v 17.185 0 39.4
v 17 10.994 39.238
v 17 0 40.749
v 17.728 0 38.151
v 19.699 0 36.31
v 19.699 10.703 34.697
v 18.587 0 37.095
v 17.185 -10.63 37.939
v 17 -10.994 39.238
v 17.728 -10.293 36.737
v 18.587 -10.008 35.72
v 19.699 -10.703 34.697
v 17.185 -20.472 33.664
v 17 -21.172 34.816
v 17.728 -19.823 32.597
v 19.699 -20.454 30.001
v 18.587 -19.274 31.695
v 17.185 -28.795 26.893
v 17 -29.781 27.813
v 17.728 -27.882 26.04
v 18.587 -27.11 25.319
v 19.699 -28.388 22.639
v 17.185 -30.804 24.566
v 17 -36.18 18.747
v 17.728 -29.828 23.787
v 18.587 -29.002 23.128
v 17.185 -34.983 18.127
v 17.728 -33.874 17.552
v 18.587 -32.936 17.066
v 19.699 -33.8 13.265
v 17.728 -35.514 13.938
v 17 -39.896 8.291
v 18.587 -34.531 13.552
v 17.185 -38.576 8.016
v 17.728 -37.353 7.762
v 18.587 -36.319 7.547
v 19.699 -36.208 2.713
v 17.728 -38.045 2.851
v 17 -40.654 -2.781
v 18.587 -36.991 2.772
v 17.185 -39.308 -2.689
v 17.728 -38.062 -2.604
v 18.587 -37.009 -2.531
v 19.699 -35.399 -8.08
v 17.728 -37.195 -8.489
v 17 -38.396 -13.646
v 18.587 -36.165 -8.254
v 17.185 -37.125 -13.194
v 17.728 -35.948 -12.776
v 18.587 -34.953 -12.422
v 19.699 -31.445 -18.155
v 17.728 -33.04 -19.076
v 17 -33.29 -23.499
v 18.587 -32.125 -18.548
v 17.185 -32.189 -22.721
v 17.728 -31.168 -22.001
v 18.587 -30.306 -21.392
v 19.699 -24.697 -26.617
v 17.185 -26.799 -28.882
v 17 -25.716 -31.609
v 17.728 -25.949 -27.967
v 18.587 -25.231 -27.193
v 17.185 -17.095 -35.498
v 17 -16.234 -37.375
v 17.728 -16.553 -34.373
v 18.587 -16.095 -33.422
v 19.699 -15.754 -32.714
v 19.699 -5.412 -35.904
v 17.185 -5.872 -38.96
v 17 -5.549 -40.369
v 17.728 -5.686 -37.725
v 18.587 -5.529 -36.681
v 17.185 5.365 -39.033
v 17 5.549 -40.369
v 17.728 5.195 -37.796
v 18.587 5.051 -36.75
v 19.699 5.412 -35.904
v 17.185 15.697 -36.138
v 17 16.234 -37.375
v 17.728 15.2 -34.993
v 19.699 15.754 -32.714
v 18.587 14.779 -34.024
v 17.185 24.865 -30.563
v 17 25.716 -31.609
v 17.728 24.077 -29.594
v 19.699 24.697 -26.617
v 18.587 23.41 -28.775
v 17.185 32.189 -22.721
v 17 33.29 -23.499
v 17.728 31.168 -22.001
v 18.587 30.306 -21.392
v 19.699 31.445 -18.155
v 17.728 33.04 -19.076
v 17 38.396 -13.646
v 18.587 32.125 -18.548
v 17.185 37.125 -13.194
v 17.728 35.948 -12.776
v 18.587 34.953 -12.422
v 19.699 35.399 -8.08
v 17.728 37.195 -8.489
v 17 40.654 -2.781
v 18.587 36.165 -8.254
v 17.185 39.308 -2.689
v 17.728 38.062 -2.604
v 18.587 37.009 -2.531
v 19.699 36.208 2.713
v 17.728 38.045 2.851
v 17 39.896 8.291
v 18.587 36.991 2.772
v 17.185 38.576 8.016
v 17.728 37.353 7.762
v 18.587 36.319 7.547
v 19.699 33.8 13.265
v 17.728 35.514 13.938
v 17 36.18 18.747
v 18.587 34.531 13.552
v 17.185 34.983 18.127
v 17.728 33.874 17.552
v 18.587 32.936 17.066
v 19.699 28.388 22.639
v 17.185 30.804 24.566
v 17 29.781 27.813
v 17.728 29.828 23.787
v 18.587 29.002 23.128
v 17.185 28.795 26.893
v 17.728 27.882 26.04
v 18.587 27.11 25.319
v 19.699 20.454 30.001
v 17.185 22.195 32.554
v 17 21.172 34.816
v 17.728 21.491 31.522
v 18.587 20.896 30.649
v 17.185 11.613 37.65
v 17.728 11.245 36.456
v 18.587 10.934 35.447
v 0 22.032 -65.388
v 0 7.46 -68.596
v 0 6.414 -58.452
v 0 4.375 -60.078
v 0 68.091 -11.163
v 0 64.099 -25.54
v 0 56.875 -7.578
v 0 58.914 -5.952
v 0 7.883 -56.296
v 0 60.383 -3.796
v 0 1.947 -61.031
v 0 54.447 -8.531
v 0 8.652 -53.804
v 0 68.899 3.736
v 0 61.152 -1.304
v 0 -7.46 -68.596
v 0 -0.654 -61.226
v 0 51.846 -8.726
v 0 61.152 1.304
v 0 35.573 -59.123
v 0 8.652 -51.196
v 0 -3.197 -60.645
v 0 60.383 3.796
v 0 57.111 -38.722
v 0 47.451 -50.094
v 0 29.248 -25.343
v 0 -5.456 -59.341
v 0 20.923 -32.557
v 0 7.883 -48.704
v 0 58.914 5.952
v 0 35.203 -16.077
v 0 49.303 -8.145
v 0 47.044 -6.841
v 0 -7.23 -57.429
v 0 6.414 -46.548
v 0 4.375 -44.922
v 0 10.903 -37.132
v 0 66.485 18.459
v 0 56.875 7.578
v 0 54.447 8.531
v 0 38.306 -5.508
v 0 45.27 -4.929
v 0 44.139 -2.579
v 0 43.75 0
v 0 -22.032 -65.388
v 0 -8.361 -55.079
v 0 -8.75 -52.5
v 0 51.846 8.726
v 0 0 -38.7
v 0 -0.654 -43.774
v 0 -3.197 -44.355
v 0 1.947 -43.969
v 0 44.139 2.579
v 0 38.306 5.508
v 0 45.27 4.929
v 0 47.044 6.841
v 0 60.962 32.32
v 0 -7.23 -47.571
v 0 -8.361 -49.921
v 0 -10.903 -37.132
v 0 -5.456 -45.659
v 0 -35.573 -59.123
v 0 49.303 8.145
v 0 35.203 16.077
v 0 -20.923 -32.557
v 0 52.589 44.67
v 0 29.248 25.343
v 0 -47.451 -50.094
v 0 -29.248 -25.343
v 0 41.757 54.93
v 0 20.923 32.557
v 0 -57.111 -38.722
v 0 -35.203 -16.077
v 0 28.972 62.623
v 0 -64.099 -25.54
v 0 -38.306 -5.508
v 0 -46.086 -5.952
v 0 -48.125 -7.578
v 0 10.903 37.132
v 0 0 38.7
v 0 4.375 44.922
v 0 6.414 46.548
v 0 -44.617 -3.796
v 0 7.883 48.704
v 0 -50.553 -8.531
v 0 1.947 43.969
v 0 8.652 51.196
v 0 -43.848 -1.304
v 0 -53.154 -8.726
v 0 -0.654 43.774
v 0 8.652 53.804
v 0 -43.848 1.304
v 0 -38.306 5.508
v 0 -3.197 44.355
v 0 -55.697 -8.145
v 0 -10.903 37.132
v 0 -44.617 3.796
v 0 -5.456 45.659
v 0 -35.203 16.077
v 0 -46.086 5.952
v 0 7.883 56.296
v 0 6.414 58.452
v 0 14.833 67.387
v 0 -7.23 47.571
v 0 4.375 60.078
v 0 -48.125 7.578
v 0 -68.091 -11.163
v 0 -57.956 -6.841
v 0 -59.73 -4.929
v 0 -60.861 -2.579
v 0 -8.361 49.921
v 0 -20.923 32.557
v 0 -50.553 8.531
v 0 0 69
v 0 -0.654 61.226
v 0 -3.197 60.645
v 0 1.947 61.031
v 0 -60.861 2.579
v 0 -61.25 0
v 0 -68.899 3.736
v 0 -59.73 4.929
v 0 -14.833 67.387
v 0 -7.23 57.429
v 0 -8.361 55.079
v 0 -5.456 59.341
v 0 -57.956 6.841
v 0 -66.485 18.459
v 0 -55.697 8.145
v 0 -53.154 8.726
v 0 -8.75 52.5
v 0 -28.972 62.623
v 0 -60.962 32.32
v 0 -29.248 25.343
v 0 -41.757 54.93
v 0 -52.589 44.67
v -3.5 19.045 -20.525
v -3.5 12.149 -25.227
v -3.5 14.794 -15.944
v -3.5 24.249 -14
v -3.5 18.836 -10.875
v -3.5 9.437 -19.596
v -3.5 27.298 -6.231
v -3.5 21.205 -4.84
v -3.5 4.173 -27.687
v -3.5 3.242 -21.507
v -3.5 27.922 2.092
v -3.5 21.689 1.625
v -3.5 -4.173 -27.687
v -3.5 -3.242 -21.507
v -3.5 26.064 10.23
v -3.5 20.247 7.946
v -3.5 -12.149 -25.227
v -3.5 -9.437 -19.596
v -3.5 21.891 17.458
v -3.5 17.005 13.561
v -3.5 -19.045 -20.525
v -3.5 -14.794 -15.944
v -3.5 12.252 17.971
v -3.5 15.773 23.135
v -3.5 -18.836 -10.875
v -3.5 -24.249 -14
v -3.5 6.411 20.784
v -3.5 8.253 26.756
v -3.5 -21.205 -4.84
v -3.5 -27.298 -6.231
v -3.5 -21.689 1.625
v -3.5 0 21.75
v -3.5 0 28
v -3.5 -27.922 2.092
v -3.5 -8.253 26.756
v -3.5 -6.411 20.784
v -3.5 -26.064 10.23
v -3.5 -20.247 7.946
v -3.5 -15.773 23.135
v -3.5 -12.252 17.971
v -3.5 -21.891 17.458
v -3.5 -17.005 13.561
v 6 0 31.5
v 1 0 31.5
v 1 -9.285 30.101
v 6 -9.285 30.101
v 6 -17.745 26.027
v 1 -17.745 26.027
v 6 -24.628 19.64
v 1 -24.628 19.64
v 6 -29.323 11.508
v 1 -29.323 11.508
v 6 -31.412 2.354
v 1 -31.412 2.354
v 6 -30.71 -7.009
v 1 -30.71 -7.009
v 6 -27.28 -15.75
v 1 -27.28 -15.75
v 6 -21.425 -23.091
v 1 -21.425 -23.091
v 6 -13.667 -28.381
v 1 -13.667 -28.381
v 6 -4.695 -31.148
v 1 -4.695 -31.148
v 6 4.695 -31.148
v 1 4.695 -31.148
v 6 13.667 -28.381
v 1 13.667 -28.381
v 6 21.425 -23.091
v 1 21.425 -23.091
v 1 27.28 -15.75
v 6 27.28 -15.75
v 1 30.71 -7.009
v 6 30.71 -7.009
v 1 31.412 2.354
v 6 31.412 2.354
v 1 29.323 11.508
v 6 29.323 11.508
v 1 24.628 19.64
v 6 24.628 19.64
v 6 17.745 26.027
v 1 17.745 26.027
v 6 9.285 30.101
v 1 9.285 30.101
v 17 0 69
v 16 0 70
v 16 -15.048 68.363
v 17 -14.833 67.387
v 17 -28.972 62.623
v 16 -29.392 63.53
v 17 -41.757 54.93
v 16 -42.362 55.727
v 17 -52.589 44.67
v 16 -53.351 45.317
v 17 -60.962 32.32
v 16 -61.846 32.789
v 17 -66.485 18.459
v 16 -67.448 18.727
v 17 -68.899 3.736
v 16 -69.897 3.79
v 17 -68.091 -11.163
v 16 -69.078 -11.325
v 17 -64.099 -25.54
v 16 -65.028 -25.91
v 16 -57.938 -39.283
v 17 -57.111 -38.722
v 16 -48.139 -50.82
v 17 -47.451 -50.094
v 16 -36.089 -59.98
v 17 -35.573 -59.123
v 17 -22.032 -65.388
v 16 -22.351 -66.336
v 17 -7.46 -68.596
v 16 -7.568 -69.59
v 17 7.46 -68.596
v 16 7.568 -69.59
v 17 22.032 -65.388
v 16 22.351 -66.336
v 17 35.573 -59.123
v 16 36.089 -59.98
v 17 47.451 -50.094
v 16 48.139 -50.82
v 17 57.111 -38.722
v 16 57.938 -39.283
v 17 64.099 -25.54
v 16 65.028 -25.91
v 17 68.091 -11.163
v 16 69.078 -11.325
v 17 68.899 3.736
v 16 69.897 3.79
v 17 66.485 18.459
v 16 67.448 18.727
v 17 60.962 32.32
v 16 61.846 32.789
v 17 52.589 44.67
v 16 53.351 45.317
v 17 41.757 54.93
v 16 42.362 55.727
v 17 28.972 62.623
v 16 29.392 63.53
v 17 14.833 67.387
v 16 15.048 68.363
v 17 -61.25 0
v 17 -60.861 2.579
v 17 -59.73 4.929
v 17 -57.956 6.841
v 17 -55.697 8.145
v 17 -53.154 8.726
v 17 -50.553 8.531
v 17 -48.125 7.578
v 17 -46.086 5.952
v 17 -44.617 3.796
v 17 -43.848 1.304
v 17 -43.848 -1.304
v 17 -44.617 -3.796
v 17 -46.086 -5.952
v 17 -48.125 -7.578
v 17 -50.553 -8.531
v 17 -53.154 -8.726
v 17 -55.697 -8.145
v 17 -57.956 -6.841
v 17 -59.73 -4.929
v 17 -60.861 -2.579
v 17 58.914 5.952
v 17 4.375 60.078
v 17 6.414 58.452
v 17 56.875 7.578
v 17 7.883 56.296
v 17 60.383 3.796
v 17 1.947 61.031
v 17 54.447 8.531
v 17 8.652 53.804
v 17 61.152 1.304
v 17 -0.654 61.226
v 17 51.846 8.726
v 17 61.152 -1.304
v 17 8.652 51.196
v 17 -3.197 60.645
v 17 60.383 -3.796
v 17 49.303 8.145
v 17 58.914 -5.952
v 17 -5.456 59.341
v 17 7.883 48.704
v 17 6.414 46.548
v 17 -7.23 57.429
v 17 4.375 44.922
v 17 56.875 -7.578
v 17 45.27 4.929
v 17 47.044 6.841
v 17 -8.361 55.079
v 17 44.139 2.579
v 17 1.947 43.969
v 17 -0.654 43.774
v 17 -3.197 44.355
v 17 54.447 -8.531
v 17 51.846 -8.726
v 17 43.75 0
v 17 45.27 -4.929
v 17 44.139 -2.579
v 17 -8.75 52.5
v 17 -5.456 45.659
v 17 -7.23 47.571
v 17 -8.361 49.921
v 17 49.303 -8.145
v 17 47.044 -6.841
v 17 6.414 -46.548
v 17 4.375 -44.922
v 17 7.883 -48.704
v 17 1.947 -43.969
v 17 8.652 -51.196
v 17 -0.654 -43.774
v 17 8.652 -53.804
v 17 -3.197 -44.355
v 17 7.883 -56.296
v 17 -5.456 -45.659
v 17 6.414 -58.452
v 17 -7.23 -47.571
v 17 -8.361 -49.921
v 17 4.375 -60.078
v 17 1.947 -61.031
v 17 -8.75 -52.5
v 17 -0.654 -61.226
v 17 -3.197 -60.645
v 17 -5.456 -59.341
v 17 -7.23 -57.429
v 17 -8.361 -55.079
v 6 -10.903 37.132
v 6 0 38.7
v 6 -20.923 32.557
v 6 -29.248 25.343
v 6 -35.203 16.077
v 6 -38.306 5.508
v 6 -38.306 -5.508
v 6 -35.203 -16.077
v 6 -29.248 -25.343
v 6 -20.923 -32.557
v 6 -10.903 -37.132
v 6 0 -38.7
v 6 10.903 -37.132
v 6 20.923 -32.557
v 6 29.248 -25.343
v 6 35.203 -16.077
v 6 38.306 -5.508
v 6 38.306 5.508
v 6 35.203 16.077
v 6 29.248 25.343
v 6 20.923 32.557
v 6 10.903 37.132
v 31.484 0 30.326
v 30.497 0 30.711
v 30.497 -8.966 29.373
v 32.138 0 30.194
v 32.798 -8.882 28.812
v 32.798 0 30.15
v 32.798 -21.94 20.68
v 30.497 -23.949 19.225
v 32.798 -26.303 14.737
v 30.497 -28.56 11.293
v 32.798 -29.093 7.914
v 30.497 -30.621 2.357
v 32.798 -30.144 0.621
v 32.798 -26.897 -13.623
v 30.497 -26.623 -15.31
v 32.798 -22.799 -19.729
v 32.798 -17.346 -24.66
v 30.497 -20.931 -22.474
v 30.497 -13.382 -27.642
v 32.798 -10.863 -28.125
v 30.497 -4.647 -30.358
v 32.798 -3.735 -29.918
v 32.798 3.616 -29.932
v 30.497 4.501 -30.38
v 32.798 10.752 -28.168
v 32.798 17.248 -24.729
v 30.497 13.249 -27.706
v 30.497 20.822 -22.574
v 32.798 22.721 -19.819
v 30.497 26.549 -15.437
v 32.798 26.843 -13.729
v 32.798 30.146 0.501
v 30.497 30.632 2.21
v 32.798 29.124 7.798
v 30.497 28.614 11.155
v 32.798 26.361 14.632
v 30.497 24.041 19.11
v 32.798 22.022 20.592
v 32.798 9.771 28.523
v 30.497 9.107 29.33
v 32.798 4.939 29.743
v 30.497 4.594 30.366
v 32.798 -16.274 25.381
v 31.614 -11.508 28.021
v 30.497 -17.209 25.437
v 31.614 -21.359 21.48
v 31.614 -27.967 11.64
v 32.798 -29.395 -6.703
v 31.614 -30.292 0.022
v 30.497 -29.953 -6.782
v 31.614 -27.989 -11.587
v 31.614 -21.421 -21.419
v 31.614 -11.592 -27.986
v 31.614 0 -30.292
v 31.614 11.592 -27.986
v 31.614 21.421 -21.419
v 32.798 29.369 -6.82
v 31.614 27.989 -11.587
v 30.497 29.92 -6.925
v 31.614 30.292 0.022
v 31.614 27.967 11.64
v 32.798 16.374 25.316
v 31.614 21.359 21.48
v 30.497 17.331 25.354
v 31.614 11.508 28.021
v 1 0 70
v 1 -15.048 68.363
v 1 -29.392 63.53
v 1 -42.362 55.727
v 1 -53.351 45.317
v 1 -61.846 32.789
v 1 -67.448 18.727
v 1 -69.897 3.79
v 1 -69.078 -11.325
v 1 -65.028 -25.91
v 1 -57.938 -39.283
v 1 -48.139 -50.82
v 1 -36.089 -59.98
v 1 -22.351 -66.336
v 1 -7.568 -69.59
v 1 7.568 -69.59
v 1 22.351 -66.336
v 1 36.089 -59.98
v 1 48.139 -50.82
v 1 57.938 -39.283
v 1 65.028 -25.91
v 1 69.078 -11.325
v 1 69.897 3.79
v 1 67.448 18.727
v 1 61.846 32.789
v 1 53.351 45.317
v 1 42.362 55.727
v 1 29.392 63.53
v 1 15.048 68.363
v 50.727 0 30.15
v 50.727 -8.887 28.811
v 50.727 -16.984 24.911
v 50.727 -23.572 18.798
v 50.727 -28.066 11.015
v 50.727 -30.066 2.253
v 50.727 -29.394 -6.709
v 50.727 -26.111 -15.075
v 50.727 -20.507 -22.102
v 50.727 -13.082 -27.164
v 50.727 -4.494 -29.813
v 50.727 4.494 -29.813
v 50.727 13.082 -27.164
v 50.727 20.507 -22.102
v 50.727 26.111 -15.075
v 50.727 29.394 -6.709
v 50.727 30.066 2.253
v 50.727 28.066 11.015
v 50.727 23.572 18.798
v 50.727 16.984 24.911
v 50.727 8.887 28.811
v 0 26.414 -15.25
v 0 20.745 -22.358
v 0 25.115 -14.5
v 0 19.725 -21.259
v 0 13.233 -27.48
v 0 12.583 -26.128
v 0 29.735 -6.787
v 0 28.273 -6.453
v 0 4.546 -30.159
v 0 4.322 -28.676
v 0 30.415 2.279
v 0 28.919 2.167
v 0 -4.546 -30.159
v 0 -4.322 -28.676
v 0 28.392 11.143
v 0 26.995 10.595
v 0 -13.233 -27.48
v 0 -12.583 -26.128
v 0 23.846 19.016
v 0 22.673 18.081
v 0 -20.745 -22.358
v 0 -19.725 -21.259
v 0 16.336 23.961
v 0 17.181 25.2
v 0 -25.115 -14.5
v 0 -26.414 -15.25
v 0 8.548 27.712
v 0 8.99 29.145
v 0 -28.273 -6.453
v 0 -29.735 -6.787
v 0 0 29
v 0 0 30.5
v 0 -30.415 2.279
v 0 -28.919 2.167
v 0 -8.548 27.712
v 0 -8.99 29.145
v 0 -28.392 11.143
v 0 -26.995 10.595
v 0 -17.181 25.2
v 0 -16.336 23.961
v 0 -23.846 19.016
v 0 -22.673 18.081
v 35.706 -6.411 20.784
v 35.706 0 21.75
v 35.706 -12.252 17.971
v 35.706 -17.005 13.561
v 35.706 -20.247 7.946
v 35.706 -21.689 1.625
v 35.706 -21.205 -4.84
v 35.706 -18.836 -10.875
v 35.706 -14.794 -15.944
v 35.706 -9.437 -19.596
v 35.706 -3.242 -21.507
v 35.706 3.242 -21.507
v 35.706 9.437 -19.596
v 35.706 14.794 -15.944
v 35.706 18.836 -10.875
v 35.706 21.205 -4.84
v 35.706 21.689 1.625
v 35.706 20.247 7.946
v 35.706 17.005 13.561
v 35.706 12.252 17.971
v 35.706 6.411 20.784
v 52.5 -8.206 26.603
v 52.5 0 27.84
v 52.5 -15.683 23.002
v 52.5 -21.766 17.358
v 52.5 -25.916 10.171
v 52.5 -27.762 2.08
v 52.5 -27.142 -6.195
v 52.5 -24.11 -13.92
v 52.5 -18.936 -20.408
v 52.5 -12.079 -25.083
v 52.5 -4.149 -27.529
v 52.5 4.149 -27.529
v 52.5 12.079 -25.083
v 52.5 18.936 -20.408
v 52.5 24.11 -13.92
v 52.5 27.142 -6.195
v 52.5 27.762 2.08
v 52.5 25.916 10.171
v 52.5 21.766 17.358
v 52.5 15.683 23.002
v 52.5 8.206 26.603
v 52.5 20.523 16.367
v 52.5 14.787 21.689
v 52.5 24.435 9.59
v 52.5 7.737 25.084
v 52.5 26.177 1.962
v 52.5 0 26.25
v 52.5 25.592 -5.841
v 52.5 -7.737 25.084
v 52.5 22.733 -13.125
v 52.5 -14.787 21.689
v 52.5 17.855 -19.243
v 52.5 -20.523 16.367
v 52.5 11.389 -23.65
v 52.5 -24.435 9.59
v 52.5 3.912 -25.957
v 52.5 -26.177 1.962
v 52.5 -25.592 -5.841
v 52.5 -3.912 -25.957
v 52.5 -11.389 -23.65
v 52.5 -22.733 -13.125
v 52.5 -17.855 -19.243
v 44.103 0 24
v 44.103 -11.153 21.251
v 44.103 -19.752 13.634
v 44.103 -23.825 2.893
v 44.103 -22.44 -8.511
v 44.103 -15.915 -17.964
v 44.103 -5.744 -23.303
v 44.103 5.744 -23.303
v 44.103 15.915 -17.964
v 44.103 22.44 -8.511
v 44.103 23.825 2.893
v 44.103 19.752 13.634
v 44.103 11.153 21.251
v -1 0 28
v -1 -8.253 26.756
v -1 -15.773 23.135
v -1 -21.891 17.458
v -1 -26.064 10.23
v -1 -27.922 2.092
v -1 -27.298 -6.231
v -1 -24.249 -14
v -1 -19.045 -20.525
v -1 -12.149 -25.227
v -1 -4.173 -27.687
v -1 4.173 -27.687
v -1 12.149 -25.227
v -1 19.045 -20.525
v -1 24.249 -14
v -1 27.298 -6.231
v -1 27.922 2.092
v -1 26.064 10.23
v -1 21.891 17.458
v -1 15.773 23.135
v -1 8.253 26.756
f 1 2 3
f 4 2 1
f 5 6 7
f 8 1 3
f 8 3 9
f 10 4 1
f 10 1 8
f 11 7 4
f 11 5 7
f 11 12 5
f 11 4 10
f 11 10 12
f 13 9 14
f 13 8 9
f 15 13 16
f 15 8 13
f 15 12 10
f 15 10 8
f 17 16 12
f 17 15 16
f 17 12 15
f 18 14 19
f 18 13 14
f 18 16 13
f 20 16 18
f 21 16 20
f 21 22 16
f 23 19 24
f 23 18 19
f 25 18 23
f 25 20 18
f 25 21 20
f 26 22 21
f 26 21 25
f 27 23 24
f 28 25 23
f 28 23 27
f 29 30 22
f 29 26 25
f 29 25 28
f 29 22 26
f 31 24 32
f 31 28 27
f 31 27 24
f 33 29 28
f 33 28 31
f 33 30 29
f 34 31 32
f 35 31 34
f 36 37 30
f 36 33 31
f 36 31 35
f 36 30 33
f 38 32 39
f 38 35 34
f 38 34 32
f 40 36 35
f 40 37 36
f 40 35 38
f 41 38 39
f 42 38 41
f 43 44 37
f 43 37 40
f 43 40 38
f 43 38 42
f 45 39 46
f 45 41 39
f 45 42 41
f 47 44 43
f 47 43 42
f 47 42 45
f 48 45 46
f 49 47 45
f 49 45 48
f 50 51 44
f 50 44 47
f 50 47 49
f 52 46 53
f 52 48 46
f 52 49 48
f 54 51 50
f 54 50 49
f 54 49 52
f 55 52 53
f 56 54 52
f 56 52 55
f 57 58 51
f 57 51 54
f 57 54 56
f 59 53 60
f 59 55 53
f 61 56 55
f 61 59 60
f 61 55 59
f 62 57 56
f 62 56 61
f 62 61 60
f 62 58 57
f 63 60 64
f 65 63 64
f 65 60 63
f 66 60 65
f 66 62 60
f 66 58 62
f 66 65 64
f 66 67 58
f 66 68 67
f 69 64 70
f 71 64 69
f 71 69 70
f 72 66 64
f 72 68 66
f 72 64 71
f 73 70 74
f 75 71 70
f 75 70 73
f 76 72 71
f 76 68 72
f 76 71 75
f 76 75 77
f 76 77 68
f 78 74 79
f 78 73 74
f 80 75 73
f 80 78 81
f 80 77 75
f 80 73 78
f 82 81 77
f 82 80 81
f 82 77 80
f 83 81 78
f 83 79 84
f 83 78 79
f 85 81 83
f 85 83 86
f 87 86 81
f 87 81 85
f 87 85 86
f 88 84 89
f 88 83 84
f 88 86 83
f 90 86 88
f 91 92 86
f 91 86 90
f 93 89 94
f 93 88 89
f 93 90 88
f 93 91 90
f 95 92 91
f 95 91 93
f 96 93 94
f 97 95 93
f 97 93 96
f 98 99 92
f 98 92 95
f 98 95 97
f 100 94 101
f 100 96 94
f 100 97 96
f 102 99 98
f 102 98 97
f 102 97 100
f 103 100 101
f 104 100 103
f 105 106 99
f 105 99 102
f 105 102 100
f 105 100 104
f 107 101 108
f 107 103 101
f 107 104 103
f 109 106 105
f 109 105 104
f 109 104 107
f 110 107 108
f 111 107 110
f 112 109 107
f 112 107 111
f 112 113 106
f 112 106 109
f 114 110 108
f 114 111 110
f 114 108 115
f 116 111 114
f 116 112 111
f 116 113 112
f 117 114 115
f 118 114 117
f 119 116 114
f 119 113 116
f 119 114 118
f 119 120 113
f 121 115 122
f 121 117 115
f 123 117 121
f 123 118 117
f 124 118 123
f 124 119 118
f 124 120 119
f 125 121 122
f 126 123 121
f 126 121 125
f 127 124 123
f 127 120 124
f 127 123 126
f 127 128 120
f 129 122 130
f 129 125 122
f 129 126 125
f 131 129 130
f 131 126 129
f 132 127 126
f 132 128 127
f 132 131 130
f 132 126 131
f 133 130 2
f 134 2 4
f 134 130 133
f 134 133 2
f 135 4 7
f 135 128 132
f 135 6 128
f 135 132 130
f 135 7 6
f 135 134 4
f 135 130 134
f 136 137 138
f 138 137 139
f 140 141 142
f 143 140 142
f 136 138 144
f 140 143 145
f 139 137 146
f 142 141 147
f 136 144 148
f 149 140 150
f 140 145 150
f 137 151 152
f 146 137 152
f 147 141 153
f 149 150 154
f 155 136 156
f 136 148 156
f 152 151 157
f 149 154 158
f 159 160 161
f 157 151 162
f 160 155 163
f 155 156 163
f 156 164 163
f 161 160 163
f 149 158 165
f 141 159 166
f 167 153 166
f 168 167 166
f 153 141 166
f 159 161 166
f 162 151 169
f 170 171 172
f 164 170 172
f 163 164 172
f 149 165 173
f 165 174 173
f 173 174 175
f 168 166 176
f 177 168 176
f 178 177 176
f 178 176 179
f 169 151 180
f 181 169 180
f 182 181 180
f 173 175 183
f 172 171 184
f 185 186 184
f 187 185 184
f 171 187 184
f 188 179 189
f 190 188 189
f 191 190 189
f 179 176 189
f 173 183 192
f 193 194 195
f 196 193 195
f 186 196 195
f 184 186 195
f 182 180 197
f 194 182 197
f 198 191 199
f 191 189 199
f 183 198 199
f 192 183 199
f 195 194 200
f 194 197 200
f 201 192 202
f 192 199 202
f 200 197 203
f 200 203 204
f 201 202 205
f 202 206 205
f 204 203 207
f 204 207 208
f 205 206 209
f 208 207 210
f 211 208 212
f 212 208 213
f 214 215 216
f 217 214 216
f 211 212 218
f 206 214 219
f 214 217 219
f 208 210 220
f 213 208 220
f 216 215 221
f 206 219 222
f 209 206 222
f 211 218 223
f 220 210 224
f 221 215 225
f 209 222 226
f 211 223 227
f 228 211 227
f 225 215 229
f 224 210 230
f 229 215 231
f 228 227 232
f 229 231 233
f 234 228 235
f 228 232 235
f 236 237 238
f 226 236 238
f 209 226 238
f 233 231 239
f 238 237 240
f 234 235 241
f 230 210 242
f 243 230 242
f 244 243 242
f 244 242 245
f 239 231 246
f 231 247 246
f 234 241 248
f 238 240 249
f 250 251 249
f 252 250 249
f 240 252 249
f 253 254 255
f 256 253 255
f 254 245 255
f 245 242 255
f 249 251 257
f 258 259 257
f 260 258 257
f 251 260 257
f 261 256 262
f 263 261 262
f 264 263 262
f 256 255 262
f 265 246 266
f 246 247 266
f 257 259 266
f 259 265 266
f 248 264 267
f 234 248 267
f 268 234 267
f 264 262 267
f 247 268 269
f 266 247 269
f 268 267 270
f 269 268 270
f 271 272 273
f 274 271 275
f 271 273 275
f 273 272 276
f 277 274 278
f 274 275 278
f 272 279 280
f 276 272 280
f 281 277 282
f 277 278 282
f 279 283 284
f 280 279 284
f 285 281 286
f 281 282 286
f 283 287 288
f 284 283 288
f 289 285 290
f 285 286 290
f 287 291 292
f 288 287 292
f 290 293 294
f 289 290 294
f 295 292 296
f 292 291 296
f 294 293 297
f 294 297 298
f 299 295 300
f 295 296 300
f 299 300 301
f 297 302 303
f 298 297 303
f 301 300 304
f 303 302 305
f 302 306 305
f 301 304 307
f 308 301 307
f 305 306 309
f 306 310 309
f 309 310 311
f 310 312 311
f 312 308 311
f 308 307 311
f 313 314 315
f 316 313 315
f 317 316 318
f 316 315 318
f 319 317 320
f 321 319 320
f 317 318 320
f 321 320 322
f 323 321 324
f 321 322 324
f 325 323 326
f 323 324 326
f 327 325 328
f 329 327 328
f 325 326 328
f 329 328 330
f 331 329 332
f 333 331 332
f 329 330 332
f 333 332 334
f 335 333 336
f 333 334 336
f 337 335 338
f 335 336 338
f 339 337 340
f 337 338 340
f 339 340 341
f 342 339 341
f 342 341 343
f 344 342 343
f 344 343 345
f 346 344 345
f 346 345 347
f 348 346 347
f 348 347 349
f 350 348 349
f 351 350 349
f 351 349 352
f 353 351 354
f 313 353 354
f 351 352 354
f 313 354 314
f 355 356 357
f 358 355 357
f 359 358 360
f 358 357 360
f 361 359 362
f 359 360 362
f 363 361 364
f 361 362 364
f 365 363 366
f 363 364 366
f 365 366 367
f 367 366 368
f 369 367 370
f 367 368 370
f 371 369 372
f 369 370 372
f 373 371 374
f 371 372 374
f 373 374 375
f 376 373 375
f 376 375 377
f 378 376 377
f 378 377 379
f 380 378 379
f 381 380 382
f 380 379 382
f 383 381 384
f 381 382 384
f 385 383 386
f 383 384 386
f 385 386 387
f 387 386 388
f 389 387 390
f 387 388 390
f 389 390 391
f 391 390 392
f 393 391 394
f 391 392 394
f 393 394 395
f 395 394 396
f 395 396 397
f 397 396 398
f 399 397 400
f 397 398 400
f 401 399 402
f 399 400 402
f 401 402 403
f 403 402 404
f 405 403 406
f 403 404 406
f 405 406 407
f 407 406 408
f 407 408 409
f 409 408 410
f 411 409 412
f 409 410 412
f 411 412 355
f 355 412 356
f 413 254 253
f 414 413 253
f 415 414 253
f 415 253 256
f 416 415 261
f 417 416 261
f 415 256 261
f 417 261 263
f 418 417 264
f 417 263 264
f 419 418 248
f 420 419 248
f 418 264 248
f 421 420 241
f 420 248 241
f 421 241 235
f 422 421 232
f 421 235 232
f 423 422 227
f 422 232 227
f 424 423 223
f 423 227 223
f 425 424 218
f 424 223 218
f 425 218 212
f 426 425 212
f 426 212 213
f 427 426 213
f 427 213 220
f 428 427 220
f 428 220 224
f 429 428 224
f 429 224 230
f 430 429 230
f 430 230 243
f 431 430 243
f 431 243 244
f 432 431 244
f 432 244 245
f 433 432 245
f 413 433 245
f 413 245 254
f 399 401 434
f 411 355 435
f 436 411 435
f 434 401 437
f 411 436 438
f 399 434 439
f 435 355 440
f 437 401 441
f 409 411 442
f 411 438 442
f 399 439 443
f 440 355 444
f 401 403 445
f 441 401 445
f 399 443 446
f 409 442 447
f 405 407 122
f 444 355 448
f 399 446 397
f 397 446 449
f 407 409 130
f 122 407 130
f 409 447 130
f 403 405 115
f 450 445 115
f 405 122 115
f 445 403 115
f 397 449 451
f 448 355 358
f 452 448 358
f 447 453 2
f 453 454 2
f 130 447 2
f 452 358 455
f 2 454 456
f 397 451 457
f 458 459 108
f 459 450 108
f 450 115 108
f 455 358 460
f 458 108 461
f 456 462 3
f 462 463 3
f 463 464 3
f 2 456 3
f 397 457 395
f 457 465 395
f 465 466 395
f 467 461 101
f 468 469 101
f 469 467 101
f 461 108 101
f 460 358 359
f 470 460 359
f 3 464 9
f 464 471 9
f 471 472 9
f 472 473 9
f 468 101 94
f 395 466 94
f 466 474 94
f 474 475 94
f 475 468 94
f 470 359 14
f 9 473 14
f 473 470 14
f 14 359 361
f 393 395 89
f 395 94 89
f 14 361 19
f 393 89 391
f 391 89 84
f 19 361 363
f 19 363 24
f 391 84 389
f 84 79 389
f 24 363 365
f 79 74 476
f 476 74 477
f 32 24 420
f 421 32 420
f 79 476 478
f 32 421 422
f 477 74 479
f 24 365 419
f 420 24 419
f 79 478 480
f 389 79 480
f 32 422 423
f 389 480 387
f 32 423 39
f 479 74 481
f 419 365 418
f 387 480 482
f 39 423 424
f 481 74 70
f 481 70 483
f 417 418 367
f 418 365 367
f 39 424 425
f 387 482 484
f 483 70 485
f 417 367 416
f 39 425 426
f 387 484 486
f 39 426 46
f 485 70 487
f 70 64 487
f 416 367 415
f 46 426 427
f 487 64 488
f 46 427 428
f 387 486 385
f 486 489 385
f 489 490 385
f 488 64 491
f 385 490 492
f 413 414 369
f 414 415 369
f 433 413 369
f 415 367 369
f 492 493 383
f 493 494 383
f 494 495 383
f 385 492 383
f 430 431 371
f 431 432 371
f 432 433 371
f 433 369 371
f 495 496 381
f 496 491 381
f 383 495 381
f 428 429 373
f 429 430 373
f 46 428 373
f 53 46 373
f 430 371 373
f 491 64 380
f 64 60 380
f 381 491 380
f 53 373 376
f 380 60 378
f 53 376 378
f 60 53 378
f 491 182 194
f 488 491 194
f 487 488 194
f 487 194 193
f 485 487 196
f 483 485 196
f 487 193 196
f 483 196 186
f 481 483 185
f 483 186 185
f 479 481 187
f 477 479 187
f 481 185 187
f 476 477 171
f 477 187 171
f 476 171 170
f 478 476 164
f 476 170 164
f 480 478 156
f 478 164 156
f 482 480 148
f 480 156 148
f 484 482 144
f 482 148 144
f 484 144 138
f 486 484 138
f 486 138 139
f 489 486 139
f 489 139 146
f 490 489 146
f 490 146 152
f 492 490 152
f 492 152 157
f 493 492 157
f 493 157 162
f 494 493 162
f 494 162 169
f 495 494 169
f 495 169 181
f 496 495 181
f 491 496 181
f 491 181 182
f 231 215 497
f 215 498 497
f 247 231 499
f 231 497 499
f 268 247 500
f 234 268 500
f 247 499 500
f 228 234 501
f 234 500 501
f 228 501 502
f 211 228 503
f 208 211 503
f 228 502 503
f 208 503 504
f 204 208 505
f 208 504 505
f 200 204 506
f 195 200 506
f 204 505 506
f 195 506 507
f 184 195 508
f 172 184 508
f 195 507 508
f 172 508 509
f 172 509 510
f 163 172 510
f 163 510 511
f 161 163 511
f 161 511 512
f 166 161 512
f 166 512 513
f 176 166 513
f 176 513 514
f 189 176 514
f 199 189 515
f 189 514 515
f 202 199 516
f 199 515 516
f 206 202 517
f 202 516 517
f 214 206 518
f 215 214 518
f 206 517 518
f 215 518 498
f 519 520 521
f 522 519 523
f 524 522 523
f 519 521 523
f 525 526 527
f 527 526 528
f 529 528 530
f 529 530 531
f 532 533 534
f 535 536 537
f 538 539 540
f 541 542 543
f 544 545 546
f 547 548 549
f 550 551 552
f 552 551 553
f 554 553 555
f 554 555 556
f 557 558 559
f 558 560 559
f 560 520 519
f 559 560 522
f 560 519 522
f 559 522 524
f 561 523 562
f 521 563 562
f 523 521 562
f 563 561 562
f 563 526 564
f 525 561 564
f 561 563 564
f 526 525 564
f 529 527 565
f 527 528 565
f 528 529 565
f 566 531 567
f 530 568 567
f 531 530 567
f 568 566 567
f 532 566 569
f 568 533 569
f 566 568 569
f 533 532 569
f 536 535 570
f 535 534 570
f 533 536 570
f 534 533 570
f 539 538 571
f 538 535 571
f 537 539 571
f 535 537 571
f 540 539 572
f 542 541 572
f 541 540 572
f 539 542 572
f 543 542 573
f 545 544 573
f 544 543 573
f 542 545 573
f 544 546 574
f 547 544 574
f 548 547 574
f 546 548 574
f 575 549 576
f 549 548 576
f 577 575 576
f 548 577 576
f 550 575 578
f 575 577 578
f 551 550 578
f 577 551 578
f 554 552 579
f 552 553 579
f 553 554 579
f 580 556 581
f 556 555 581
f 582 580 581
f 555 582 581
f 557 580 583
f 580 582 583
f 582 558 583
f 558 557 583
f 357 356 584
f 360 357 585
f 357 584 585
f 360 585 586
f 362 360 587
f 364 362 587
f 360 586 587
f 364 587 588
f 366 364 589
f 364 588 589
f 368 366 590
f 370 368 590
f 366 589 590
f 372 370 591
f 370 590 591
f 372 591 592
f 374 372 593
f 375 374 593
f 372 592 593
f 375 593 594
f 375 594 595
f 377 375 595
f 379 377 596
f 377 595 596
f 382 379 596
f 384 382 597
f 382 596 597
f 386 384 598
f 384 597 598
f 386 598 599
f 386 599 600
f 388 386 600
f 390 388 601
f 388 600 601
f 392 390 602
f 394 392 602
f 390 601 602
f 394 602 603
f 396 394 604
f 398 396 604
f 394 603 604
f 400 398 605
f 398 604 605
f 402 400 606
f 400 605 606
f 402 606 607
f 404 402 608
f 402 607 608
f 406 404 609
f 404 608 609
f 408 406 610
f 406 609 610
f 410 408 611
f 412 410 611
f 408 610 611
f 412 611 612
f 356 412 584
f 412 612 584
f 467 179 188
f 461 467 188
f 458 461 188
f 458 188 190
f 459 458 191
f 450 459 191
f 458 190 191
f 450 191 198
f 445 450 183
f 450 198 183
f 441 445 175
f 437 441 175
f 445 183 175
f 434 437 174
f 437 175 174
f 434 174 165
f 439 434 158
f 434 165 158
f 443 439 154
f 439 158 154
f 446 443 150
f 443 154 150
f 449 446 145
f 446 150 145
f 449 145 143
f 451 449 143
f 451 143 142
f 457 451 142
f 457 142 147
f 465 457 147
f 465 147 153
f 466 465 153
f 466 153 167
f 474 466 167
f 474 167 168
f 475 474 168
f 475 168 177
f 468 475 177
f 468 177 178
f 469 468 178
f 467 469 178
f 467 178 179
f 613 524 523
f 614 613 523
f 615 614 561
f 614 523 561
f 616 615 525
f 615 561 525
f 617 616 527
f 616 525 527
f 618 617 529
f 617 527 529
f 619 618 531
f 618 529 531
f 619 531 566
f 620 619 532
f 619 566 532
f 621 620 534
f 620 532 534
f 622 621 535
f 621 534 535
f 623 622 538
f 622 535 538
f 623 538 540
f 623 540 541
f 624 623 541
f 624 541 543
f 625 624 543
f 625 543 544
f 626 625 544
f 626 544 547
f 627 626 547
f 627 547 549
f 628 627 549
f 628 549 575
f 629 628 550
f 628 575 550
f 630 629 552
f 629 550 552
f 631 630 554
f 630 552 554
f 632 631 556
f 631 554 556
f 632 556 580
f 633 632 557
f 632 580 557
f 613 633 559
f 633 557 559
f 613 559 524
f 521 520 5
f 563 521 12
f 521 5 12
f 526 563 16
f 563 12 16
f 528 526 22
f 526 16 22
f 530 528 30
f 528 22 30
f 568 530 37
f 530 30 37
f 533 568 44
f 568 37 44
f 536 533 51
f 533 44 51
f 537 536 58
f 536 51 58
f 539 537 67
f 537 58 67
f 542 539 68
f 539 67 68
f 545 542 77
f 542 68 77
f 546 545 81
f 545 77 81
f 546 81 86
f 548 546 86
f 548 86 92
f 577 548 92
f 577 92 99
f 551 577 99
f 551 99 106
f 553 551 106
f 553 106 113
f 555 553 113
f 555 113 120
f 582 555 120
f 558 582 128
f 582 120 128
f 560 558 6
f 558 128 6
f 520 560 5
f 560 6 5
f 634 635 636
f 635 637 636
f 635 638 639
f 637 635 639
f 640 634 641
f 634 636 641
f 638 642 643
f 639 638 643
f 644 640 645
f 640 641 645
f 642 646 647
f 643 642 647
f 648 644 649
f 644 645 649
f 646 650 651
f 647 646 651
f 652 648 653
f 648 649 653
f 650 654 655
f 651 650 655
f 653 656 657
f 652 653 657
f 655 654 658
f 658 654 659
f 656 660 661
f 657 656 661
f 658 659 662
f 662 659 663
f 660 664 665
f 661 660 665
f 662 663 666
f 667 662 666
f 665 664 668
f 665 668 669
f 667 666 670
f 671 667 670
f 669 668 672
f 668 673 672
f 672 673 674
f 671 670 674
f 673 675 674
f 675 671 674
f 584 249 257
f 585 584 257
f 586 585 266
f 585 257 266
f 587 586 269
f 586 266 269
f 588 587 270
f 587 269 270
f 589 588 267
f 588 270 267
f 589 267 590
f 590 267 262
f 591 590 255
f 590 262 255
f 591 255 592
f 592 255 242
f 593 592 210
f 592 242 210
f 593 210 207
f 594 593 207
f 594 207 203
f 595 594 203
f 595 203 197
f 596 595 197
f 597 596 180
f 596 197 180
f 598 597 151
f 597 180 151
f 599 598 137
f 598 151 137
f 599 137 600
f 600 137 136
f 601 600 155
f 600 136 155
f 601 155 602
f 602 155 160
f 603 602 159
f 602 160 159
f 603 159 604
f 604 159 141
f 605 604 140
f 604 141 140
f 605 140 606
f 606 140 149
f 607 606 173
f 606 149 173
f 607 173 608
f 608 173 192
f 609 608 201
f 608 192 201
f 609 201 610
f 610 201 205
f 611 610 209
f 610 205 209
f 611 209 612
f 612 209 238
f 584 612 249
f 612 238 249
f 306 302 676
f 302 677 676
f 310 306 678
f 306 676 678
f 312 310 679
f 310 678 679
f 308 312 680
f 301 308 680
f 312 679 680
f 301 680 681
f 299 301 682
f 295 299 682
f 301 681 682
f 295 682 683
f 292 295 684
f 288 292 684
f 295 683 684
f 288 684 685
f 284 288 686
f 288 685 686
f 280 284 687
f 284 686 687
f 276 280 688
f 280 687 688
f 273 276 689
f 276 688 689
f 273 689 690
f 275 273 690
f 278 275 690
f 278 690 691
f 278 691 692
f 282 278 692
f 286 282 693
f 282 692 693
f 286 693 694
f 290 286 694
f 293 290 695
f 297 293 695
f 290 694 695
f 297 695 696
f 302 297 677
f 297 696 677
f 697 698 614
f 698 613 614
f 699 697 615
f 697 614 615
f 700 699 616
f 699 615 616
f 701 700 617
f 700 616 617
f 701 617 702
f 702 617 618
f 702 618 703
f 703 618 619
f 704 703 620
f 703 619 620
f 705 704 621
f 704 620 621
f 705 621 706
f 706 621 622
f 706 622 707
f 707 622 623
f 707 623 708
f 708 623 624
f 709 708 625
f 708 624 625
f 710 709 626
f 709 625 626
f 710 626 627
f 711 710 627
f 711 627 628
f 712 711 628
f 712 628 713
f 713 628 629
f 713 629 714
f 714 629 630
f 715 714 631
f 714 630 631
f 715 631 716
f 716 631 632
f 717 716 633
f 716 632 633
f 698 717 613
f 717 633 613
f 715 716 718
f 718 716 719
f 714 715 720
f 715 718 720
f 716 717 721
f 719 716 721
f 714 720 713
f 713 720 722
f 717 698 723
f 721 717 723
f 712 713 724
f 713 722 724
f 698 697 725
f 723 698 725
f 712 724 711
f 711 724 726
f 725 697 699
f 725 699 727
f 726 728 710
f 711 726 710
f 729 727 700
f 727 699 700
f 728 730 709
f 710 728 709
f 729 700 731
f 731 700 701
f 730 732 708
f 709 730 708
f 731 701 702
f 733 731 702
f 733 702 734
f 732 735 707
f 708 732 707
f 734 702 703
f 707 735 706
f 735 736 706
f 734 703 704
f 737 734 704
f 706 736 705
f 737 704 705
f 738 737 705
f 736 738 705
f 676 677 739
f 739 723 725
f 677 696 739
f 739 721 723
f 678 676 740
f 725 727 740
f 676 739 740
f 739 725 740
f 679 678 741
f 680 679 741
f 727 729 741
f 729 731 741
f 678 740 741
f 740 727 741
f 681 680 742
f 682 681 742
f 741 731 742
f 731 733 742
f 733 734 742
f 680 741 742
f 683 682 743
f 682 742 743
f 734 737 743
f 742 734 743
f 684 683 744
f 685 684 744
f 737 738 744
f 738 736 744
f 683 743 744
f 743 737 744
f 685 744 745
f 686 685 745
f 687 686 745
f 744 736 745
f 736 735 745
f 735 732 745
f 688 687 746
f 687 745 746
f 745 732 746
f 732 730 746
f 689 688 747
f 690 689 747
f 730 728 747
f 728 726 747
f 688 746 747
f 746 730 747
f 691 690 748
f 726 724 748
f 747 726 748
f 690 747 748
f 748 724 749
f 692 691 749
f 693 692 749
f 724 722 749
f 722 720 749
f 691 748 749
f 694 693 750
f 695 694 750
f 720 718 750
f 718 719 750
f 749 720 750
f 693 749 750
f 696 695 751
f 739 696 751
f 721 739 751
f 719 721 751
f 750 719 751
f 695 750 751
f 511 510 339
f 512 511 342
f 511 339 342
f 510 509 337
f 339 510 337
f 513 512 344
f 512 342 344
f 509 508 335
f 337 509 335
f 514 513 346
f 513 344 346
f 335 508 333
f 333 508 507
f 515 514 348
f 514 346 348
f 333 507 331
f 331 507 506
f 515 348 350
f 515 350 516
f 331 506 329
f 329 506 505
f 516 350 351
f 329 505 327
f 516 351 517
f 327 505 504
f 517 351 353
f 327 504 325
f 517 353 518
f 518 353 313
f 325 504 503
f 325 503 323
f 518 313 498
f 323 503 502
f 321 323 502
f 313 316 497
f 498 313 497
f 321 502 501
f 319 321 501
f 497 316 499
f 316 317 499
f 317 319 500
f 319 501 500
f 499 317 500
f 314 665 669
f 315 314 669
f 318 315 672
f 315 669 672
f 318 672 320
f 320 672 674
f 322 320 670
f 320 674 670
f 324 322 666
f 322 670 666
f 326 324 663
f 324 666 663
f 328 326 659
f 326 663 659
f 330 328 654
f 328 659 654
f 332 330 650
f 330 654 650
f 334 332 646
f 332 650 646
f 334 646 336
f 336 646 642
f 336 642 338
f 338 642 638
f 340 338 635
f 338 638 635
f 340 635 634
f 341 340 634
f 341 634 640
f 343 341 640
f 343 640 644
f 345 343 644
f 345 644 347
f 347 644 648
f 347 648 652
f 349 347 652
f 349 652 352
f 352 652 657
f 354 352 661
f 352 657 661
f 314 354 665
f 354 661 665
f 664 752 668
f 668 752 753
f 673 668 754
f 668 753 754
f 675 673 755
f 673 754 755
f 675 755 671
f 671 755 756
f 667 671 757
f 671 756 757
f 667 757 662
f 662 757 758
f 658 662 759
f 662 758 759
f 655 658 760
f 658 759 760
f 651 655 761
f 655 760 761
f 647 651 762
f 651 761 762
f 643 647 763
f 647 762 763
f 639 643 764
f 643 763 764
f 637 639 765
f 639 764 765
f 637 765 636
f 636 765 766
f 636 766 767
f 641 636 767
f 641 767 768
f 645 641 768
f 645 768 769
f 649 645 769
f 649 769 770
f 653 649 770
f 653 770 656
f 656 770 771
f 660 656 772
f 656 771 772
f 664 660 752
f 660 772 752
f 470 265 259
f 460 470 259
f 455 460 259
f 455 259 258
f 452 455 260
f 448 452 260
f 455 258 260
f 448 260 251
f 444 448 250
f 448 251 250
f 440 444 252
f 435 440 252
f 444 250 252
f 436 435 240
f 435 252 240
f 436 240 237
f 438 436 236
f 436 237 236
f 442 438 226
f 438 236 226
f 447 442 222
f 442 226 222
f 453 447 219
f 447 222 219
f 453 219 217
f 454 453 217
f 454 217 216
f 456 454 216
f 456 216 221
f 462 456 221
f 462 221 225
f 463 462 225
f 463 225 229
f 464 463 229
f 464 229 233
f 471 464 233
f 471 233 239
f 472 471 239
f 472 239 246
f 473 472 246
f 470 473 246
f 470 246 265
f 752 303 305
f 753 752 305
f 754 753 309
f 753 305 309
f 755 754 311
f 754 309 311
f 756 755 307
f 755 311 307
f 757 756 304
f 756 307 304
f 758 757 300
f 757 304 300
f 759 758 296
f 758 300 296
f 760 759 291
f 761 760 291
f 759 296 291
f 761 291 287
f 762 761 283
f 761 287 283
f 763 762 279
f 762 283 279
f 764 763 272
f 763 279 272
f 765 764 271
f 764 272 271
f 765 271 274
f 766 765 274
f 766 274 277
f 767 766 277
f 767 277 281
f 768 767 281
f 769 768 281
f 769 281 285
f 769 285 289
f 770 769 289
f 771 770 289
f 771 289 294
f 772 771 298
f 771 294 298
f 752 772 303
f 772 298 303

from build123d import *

# Parameters (mm, degrees)
F2_SIZE  = 1
F4_R     = 5
F5_R     = 8.75
F6_DEPTH = 52.501


# Not quite as in the source:
# - two fillets or chamfers of one size are made in one step


with BuildPart() as f1:
    # F0 (on Front) → F1 (revolve)
    with BuildSketch(Plane.XZ):
        Polygon((-3.5, 21.75), (35.7057713659, 21.75), (52.5, 26.25), (52.5, 27.84), (50.7274746578, 30.15), (31.5788313746, 30.15), (17, 37.7090089023), (17, 70), (0, 70), (0, 38.7), (6, 38.7), (6, 31.5), (0, 31.5), (0, 28), (-3.5, 28), align=None)
    revolve(axis=Axis((44.485598996, 0, 0), (1, 0, 0)))

    # F2
    f2_edges = [f1.edges().sort_by_distance(p)[0] for p in [
        (17, 0, -70),
        (0, 0, -70),
        (0, 0, -31.5),
        (0, 0, -28),
    ]]
    chamfer(f2_edges, length=F2_SIZE)

    # F4
    f4_edges = [f1.edges().sort_by_distance(p)[0] for p in [
        (17, 0, -37.709009),
        (31.578831, 0, -30.15),
    ]]
    fillet(f4_edges, radius=F4_R)

    # F5 (on face) → F6 (cut, through all)
    with BuildSketch(Plane(origin=(0, 0, 0), x_dir=(0, -1, 0), z_dir=(-1, 0, 0))):
        with Locations((0, 52.5)):
            Circle(F5_R)
        with Locations((-52.5, 0)):
            Circle(F5_R)
        with Locations((52.5, 0)):
            Circle(F5_R)
        with Locations((0, -52.5)):
            Circle(F5_R)
    extrude(amount=-F6_DEPTH, mode=Mode.SUBTRACT)


solid = f1.part
